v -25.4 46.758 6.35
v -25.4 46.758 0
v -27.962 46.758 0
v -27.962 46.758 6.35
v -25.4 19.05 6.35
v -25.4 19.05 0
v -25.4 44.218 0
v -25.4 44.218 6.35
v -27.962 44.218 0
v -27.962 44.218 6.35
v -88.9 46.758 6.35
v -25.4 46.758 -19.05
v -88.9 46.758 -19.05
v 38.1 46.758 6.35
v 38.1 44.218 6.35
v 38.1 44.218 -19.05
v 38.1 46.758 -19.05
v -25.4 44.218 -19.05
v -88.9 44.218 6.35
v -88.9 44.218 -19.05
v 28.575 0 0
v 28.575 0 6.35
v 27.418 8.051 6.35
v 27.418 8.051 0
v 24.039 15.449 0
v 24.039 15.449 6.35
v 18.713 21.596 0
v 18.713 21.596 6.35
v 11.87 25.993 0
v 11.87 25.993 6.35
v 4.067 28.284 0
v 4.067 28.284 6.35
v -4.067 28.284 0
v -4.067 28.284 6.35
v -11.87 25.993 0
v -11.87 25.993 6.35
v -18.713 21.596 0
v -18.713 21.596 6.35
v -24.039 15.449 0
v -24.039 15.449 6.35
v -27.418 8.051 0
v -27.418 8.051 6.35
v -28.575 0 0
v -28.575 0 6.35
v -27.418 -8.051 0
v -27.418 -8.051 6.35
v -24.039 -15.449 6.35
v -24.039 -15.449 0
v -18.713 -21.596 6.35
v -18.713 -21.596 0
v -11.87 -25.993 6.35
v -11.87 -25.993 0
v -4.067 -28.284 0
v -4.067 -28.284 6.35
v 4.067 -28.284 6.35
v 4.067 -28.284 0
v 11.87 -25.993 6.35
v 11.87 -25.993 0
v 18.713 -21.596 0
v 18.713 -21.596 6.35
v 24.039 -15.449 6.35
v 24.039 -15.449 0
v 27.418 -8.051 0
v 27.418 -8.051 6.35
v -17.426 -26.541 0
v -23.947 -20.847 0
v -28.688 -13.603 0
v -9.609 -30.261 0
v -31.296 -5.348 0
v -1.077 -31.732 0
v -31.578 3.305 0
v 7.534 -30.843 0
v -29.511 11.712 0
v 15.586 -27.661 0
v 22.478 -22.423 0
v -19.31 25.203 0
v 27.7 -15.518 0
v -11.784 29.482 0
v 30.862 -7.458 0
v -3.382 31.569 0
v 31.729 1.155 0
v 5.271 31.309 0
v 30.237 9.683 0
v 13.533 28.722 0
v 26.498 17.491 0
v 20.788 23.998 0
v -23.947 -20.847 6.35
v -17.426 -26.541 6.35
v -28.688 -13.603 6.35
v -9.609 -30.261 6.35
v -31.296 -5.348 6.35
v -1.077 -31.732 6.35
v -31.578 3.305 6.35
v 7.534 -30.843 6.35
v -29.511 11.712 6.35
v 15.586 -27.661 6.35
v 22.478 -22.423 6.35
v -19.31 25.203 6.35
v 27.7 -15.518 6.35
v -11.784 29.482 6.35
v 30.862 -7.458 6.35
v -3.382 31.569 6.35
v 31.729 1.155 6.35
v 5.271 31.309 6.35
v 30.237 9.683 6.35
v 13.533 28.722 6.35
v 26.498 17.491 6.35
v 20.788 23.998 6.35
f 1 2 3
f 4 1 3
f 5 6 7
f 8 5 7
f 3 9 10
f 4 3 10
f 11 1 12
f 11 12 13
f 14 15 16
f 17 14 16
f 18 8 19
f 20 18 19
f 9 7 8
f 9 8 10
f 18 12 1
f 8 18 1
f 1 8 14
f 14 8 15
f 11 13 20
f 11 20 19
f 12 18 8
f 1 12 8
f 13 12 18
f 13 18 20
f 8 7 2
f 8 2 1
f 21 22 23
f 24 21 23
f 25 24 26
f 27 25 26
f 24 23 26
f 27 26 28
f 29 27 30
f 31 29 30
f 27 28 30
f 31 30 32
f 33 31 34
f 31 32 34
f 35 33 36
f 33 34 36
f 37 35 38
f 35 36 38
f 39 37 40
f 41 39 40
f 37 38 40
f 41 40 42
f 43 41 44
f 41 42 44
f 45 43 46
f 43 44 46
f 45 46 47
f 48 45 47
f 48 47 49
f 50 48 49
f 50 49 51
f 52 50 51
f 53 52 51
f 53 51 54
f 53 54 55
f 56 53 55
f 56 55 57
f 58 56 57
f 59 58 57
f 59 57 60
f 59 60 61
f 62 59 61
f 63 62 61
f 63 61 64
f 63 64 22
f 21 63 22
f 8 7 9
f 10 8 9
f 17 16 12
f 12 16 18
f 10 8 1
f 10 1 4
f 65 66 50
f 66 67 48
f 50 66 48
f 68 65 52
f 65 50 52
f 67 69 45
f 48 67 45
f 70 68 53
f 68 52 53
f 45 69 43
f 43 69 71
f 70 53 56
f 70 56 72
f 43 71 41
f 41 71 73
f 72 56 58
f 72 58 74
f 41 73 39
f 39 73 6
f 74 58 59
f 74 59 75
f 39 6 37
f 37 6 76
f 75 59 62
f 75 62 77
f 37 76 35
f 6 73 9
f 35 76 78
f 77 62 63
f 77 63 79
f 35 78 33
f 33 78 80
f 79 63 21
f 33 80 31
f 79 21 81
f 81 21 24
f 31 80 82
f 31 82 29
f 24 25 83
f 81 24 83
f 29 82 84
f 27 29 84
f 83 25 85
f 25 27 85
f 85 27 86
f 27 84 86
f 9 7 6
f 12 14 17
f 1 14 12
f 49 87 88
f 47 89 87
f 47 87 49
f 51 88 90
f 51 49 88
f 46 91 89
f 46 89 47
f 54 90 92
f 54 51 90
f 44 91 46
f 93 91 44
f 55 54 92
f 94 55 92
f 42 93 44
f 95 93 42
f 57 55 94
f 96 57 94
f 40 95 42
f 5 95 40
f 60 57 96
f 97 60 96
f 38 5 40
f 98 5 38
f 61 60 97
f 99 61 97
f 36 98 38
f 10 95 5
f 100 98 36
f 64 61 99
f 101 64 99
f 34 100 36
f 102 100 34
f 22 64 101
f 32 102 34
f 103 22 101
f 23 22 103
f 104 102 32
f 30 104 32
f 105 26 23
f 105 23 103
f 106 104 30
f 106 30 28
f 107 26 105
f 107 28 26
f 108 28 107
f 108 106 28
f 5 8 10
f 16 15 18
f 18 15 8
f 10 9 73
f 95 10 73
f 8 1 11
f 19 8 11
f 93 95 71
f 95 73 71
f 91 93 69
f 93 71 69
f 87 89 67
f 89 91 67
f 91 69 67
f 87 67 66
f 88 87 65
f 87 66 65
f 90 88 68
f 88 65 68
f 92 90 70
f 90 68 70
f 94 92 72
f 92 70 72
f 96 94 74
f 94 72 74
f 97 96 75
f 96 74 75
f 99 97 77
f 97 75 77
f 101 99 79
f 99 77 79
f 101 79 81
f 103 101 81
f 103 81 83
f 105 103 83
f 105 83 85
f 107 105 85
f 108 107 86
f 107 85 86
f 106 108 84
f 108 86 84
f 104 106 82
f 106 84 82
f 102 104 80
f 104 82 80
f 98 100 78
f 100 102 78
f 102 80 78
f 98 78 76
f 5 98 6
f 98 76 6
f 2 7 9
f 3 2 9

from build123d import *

# Parameters (mm, degrees)
F0_R      = 31.75
F1_DEPTH  = 6.35
F2_R      = 28.575
F3_DEPTH  = 25.4
F6_DEPTH  = 6.35
F8_DEPTH  = 2.54
F9_DEPTH  = 2.54
F10_W     = 63.5
F10_H     = 25.4
F11_DEPTH = 2.54


with BuildPart() as f1:
    # F0 (on Top) → F1 (new body)
    with BuildSketch(Plane.XY):
        Circle(F0_R)
    extrude(amount=F1_DEPTH)

    # F2 (on face) → F3 (cut)
    with BuildSketch(Plane.XY.offset(6.35)):
        Circle(F2_R)
    extrude(amount=-F3_DEPTH, mode=Mode.SUBTRACT)

    # F5 (on face) → F6 (join)
    with BuildSketch(Plane.XY):
        Polygon((-27.9624909163, 44.2176200449), (-29.6212788671, 9.3955891207), (-25.4, 15.2678118412), (-25.4, 44.2176200449), align=None)
    extrude(amount=F6_DEPTH)


with BuildPart() as f8:
    # F7 (on face) → F8 (new body)
    with BuildSketch(Plane(origin=(0, 44.2176200449, 0), x_dir=(-1, 0, 0), z_dir=(0, 1, 0))):
        Polygon((25.4, 0), (25.4, 6.35), (-38.1, 6.35), (-38.1, -19.05), (25.4, -19.05), align=None)
    extrude(amount=F8_DEPTH)


with BuildPart() as f9:
    # F9 (new): a face of the model
    f9_faces = [f1.part.faces().sort_by_distance(p)[0] for p in [
        (-26.6812454581, 44.2176200449, 3.175),
    ]]
    extrude(f9_faces, amount=F9_DEPTH)


with BuildPart() as f11:
    # F10 (on face) → F11 (new body)
    with BuildSketch(Plane(origin=(0, 46.7576200449, 0), x_dir=(-1, 0, 0), z_dir=(0, 1, 0))):
        with Locations((57.15, -6.35)):
            Rectangle(F10_W, F10_H)
    extrude(amount=-F11_DEPTH)


solid = Compound([f1.part, f8.part, f9.part, f11.part])
